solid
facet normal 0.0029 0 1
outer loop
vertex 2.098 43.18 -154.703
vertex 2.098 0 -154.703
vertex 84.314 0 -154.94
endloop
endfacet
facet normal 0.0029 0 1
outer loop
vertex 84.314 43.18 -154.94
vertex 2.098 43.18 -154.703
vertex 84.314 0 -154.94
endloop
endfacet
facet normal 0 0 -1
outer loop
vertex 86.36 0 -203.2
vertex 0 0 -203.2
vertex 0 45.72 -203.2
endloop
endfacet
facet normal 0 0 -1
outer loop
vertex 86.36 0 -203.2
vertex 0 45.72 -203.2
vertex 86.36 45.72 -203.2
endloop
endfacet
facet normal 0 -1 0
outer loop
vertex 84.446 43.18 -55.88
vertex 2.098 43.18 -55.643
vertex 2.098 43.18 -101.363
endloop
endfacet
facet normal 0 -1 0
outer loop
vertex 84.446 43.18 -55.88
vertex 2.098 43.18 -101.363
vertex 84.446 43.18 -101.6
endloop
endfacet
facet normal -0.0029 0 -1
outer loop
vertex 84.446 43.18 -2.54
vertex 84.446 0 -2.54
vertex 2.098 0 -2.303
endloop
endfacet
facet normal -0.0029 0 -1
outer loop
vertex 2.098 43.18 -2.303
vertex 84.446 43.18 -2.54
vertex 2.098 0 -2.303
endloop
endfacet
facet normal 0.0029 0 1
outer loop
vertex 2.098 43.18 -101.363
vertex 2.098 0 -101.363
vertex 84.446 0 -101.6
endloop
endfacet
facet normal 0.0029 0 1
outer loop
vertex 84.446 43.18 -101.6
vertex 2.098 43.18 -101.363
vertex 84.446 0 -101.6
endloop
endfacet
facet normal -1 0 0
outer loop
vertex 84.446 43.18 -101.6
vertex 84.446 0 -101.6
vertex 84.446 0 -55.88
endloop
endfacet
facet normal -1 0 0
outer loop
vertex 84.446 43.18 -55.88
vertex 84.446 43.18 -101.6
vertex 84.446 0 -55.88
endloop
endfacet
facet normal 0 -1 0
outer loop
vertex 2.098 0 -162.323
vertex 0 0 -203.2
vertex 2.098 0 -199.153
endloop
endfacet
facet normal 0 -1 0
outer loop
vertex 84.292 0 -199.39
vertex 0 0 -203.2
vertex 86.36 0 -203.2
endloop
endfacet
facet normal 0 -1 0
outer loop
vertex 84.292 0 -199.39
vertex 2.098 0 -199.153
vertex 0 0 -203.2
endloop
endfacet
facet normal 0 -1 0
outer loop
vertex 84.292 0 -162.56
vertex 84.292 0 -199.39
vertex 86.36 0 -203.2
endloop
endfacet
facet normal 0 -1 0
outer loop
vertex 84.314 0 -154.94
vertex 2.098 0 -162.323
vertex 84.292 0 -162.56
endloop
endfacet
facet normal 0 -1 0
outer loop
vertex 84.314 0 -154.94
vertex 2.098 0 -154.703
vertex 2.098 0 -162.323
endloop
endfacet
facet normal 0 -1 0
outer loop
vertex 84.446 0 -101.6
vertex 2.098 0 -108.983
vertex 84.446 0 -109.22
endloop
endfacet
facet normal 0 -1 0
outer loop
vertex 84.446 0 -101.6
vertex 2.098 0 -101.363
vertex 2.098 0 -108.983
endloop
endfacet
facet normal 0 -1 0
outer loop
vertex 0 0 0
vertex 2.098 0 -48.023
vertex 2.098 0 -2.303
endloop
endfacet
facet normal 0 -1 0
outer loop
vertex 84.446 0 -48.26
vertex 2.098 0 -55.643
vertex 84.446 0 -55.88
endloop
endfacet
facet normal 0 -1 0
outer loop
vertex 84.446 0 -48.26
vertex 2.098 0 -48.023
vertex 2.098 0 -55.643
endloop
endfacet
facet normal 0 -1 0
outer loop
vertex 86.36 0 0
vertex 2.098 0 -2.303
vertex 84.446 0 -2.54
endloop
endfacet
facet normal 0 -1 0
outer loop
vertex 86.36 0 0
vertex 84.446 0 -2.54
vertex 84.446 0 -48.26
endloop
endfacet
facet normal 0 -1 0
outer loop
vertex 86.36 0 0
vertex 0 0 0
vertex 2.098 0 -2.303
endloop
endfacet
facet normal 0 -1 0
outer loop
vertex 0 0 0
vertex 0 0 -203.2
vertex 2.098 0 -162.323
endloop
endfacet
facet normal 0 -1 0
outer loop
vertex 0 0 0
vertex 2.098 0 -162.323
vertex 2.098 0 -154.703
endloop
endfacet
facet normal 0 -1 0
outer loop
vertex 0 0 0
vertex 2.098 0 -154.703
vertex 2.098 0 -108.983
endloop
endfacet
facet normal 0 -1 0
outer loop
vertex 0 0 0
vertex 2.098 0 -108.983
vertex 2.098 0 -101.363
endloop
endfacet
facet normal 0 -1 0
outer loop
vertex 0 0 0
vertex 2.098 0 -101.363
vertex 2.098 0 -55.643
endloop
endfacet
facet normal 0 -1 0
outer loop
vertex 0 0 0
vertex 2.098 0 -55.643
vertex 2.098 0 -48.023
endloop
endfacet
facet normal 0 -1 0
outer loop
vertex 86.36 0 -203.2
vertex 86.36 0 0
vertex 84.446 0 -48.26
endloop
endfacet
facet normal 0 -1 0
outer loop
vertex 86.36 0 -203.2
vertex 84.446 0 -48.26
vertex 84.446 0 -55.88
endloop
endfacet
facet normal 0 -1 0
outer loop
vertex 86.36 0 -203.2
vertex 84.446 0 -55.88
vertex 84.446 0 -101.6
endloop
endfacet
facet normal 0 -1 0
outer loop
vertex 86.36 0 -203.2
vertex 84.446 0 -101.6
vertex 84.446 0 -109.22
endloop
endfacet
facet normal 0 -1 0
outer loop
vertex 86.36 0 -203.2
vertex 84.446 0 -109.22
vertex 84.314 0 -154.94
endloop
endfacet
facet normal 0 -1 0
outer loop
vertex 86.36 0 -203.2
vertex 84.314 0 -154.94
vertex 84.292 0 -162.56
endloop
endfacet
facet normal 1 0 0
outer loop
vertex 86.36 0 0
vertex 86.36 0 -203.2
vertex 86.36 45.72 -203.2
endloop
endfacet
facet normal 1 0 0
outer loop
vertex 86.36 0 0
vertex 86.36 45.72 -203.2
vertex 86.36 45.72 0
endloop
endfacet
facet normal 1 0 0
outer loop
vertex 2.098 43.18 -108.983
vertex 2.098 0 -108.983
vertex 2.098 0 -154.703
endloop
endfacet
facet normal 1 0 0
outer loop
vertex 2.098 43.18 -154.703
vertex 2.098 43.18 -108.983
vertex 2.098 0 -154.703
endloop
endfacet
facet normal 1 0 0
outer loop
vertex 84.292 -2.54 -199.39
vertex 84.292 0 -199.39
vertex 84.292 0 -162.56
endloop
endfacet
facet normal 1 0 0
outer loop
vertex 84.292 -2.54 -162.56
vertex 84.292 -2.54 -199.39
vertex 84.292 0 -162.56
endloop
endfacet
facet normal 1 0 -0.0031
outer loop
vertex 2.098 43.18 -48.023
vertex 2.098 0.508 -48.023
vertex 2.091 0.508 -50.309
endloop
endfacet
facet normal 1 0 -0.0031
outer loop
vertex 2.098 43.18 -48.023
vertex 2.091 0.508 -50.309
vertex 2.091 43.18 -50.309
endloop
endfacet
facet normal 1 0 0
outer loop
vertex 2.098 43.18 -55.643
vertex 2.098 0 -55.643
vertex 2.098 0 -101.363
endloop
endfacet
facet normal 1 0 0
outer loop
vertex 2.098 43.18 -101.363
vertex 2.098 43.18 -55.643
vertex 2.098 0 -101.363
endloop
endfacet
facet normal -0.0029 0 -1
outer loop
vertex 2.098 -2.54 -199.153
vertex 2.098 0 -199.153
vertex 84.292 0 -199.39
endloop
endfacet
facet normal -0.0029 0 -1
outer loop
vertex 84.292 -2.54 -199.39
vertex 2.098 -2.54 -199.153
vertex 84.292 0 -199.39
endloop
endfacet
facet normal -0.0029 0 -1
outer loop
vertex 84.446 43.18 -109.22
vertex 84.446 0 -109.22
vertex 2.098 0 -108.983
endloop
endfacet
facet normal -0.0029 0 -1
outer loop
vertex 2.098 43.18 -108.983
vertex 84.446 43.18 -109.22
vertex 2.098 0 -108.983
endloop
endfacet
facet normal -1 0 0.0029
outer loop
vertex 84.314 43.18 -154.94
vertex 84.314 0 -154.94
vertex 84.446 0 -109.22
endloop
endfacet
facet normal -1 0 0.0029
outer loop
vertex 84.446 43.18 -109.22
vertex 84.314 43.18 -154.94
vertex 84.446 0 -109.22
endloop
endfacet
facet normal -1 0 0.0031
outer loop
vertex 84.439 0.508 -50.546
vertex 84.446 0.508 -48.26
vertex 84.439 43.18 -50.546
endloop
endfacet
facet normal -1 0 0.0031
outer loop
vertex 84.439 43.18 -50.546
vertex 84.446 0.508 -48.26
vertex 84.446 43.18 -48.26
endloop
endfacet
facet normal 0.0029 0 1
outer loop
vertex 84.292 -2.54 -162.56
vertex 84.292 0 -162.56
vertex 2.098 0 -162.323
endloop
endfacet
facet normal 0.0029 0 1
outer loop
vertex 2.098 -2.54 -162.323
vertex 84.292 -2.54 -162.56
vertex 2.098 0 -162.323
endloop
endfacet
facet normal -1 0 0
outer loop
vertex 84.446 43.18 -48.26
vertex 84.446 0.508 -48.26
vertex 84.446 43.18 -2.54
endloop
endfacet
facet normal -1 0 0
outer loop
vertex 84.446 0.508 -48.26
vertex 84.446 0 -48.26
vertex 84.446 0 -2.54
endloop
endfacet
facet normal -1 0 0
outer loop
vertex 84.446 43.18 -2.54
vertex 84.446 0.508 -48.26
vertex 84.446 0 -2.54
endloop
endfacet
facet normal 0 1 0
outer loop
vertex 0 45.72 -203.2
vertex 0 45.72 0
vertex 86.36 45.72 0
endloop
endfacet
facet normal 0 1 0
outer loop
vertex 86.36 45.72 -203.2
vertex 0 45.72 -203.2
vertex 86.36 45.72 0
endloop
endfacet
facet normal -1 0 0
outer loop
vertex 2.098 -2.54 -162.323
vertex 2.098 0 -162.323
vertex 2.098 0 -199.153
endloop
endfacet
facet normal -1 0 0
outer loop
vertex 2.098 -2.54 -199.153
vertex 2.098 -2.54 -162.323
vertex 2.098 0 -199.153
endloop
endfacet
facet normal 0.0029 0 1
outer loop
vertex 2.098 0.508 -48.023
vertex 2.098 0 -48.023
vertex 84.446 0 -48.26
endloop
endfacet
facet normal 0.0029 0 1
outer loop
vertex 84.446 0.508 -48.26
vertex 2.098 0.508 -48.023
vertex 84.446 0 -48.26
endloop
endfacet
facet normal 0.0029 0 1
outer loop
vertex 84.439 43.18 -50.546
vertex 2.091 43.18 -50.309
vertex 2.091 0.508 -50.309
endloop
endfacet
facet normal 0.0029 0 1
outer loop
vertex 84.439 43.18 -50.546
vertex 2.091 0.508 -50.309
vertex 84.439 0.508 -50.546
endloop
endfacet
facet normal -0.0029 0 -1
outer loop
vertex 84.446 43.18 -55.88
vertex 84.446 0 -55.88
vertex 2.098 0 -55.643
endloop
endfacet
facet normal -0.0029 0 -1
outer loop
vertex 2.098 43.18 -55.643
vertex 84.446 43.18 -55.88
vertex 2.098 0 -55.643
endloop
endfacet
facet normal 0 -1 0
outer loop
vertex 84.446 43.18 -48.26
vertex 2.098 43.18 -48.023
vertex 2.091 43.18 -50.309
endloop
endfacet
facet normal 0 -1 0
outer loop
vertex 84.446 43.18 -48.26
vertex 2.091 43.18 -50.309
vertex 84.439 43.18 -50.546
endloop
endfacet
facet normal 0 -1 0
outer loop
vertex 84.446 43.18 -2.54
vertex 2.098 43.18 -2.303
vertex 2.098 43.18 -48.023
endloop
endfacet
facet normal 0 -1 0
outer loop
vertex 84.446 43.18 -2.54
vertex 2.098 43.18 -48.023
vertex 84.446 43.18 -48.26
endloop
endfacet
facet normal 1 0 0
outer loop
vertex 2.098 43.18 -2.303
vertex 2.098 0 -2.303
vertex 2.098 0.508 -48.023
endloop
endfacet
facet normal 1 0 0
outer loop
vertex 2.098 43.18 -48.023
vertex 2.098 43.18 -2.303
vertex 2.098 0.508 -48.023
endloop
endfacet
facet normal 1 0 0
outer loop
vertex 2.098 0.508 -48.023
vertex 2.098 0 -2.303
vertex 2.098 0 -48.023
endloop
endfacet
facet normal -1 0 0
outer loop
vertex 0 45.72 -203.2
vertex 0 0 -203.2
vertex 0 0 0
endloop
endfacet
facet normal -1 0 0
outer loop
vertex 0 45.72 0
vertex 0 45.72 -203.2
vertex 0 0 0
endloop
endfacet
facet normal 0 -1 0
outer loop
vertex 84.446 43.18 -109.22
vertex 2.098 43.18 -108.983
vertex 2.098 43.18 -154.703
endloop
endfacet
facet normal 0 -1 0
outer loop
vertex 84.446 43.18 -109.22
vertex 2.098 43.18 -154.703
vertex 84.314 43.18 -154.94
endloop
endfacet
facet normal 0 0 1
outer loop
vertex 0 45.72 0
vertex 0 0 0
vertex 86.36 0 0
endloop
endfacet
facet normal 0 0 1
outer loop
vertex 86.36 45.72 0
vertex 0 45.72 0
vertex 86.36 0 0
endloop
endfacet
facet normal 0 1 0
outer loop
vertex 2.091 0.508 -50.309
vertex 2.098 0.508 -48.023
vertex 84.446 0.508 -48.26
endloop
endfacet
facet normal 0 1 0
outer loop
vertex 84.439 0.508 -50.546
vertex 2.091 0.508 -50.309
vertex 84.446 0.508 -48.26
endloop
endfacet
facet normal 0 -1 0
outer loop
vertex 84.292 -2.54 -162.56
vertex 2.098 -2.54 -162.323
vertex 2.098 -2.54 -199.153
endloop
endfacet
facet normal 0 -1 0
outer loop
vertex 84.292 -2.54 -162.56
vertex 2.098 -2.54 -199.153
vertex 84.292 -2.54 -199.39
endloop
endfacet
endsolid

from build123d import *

# Parameters (mm, degrees)
F0_W     = 86.36
F0_H     = 203.2
F1_DEPTH = 45.72
F3_DEPTH = 43.18
F5_DEPTH = 2.54
F6_W     = 82.3488
F6_H     = 42.672
F7_DEPTH = 2.286


with BuildPart() as f1:
    # F0 (on Front) → F1 (new body)
    with BuildSketch(Plane.XZ):
        with Locations((43.18, -101.6)):
            Rectangle(F0_W, F0_H)
    extrude(amount=-F1_DEPTH)

    # F2 (on face) → F3 (cut)
    with BuildSketch(Plane.XZ):
        Polygon((84.44604, -2.54), (2.097583, -2.302555), (2.097583, -48.022555), (84.44604, -48.26), align=None)
        Polygon((84.44604, -101.6), (84.44604, -55.88), (2.097583, -55.642555), (2.097583, -101.362555), align=None)
        Polygon((84.31421, -154.93981), (84.44604, -109.22), (2.097583, -108.982555), (2.097583, -154.702555), align=None)
    extrude(amount=-F3_DEPTH, mode=Mode.SUBTRACT)

    # F4 (on face) → F5 (join)
    with BuildSketch(Plane.XZ):
        Polygon((84.292239, -199.389778), (84.292239, -162.559778), (2.097583, -162.322555), (2.097583, -199.152555), align=None)
    extrude(amount=F5_DEPTH)

    # F6 (on face) → F7 (cut)
    with BuildSketch(Plane(origin=(-0.13845, 0, -48.016108), x_dir=(0.999996, 0, -0.002883), z_dir=(0.002883, 0, 0.999996))):
        with Locations((43.410442, 21.844)):
            Rectangle(F6_W, F6_H)
    extrude(amount=-F7_DEPTH, mode=Mode.SUBTRACT)


solid = f1.part
